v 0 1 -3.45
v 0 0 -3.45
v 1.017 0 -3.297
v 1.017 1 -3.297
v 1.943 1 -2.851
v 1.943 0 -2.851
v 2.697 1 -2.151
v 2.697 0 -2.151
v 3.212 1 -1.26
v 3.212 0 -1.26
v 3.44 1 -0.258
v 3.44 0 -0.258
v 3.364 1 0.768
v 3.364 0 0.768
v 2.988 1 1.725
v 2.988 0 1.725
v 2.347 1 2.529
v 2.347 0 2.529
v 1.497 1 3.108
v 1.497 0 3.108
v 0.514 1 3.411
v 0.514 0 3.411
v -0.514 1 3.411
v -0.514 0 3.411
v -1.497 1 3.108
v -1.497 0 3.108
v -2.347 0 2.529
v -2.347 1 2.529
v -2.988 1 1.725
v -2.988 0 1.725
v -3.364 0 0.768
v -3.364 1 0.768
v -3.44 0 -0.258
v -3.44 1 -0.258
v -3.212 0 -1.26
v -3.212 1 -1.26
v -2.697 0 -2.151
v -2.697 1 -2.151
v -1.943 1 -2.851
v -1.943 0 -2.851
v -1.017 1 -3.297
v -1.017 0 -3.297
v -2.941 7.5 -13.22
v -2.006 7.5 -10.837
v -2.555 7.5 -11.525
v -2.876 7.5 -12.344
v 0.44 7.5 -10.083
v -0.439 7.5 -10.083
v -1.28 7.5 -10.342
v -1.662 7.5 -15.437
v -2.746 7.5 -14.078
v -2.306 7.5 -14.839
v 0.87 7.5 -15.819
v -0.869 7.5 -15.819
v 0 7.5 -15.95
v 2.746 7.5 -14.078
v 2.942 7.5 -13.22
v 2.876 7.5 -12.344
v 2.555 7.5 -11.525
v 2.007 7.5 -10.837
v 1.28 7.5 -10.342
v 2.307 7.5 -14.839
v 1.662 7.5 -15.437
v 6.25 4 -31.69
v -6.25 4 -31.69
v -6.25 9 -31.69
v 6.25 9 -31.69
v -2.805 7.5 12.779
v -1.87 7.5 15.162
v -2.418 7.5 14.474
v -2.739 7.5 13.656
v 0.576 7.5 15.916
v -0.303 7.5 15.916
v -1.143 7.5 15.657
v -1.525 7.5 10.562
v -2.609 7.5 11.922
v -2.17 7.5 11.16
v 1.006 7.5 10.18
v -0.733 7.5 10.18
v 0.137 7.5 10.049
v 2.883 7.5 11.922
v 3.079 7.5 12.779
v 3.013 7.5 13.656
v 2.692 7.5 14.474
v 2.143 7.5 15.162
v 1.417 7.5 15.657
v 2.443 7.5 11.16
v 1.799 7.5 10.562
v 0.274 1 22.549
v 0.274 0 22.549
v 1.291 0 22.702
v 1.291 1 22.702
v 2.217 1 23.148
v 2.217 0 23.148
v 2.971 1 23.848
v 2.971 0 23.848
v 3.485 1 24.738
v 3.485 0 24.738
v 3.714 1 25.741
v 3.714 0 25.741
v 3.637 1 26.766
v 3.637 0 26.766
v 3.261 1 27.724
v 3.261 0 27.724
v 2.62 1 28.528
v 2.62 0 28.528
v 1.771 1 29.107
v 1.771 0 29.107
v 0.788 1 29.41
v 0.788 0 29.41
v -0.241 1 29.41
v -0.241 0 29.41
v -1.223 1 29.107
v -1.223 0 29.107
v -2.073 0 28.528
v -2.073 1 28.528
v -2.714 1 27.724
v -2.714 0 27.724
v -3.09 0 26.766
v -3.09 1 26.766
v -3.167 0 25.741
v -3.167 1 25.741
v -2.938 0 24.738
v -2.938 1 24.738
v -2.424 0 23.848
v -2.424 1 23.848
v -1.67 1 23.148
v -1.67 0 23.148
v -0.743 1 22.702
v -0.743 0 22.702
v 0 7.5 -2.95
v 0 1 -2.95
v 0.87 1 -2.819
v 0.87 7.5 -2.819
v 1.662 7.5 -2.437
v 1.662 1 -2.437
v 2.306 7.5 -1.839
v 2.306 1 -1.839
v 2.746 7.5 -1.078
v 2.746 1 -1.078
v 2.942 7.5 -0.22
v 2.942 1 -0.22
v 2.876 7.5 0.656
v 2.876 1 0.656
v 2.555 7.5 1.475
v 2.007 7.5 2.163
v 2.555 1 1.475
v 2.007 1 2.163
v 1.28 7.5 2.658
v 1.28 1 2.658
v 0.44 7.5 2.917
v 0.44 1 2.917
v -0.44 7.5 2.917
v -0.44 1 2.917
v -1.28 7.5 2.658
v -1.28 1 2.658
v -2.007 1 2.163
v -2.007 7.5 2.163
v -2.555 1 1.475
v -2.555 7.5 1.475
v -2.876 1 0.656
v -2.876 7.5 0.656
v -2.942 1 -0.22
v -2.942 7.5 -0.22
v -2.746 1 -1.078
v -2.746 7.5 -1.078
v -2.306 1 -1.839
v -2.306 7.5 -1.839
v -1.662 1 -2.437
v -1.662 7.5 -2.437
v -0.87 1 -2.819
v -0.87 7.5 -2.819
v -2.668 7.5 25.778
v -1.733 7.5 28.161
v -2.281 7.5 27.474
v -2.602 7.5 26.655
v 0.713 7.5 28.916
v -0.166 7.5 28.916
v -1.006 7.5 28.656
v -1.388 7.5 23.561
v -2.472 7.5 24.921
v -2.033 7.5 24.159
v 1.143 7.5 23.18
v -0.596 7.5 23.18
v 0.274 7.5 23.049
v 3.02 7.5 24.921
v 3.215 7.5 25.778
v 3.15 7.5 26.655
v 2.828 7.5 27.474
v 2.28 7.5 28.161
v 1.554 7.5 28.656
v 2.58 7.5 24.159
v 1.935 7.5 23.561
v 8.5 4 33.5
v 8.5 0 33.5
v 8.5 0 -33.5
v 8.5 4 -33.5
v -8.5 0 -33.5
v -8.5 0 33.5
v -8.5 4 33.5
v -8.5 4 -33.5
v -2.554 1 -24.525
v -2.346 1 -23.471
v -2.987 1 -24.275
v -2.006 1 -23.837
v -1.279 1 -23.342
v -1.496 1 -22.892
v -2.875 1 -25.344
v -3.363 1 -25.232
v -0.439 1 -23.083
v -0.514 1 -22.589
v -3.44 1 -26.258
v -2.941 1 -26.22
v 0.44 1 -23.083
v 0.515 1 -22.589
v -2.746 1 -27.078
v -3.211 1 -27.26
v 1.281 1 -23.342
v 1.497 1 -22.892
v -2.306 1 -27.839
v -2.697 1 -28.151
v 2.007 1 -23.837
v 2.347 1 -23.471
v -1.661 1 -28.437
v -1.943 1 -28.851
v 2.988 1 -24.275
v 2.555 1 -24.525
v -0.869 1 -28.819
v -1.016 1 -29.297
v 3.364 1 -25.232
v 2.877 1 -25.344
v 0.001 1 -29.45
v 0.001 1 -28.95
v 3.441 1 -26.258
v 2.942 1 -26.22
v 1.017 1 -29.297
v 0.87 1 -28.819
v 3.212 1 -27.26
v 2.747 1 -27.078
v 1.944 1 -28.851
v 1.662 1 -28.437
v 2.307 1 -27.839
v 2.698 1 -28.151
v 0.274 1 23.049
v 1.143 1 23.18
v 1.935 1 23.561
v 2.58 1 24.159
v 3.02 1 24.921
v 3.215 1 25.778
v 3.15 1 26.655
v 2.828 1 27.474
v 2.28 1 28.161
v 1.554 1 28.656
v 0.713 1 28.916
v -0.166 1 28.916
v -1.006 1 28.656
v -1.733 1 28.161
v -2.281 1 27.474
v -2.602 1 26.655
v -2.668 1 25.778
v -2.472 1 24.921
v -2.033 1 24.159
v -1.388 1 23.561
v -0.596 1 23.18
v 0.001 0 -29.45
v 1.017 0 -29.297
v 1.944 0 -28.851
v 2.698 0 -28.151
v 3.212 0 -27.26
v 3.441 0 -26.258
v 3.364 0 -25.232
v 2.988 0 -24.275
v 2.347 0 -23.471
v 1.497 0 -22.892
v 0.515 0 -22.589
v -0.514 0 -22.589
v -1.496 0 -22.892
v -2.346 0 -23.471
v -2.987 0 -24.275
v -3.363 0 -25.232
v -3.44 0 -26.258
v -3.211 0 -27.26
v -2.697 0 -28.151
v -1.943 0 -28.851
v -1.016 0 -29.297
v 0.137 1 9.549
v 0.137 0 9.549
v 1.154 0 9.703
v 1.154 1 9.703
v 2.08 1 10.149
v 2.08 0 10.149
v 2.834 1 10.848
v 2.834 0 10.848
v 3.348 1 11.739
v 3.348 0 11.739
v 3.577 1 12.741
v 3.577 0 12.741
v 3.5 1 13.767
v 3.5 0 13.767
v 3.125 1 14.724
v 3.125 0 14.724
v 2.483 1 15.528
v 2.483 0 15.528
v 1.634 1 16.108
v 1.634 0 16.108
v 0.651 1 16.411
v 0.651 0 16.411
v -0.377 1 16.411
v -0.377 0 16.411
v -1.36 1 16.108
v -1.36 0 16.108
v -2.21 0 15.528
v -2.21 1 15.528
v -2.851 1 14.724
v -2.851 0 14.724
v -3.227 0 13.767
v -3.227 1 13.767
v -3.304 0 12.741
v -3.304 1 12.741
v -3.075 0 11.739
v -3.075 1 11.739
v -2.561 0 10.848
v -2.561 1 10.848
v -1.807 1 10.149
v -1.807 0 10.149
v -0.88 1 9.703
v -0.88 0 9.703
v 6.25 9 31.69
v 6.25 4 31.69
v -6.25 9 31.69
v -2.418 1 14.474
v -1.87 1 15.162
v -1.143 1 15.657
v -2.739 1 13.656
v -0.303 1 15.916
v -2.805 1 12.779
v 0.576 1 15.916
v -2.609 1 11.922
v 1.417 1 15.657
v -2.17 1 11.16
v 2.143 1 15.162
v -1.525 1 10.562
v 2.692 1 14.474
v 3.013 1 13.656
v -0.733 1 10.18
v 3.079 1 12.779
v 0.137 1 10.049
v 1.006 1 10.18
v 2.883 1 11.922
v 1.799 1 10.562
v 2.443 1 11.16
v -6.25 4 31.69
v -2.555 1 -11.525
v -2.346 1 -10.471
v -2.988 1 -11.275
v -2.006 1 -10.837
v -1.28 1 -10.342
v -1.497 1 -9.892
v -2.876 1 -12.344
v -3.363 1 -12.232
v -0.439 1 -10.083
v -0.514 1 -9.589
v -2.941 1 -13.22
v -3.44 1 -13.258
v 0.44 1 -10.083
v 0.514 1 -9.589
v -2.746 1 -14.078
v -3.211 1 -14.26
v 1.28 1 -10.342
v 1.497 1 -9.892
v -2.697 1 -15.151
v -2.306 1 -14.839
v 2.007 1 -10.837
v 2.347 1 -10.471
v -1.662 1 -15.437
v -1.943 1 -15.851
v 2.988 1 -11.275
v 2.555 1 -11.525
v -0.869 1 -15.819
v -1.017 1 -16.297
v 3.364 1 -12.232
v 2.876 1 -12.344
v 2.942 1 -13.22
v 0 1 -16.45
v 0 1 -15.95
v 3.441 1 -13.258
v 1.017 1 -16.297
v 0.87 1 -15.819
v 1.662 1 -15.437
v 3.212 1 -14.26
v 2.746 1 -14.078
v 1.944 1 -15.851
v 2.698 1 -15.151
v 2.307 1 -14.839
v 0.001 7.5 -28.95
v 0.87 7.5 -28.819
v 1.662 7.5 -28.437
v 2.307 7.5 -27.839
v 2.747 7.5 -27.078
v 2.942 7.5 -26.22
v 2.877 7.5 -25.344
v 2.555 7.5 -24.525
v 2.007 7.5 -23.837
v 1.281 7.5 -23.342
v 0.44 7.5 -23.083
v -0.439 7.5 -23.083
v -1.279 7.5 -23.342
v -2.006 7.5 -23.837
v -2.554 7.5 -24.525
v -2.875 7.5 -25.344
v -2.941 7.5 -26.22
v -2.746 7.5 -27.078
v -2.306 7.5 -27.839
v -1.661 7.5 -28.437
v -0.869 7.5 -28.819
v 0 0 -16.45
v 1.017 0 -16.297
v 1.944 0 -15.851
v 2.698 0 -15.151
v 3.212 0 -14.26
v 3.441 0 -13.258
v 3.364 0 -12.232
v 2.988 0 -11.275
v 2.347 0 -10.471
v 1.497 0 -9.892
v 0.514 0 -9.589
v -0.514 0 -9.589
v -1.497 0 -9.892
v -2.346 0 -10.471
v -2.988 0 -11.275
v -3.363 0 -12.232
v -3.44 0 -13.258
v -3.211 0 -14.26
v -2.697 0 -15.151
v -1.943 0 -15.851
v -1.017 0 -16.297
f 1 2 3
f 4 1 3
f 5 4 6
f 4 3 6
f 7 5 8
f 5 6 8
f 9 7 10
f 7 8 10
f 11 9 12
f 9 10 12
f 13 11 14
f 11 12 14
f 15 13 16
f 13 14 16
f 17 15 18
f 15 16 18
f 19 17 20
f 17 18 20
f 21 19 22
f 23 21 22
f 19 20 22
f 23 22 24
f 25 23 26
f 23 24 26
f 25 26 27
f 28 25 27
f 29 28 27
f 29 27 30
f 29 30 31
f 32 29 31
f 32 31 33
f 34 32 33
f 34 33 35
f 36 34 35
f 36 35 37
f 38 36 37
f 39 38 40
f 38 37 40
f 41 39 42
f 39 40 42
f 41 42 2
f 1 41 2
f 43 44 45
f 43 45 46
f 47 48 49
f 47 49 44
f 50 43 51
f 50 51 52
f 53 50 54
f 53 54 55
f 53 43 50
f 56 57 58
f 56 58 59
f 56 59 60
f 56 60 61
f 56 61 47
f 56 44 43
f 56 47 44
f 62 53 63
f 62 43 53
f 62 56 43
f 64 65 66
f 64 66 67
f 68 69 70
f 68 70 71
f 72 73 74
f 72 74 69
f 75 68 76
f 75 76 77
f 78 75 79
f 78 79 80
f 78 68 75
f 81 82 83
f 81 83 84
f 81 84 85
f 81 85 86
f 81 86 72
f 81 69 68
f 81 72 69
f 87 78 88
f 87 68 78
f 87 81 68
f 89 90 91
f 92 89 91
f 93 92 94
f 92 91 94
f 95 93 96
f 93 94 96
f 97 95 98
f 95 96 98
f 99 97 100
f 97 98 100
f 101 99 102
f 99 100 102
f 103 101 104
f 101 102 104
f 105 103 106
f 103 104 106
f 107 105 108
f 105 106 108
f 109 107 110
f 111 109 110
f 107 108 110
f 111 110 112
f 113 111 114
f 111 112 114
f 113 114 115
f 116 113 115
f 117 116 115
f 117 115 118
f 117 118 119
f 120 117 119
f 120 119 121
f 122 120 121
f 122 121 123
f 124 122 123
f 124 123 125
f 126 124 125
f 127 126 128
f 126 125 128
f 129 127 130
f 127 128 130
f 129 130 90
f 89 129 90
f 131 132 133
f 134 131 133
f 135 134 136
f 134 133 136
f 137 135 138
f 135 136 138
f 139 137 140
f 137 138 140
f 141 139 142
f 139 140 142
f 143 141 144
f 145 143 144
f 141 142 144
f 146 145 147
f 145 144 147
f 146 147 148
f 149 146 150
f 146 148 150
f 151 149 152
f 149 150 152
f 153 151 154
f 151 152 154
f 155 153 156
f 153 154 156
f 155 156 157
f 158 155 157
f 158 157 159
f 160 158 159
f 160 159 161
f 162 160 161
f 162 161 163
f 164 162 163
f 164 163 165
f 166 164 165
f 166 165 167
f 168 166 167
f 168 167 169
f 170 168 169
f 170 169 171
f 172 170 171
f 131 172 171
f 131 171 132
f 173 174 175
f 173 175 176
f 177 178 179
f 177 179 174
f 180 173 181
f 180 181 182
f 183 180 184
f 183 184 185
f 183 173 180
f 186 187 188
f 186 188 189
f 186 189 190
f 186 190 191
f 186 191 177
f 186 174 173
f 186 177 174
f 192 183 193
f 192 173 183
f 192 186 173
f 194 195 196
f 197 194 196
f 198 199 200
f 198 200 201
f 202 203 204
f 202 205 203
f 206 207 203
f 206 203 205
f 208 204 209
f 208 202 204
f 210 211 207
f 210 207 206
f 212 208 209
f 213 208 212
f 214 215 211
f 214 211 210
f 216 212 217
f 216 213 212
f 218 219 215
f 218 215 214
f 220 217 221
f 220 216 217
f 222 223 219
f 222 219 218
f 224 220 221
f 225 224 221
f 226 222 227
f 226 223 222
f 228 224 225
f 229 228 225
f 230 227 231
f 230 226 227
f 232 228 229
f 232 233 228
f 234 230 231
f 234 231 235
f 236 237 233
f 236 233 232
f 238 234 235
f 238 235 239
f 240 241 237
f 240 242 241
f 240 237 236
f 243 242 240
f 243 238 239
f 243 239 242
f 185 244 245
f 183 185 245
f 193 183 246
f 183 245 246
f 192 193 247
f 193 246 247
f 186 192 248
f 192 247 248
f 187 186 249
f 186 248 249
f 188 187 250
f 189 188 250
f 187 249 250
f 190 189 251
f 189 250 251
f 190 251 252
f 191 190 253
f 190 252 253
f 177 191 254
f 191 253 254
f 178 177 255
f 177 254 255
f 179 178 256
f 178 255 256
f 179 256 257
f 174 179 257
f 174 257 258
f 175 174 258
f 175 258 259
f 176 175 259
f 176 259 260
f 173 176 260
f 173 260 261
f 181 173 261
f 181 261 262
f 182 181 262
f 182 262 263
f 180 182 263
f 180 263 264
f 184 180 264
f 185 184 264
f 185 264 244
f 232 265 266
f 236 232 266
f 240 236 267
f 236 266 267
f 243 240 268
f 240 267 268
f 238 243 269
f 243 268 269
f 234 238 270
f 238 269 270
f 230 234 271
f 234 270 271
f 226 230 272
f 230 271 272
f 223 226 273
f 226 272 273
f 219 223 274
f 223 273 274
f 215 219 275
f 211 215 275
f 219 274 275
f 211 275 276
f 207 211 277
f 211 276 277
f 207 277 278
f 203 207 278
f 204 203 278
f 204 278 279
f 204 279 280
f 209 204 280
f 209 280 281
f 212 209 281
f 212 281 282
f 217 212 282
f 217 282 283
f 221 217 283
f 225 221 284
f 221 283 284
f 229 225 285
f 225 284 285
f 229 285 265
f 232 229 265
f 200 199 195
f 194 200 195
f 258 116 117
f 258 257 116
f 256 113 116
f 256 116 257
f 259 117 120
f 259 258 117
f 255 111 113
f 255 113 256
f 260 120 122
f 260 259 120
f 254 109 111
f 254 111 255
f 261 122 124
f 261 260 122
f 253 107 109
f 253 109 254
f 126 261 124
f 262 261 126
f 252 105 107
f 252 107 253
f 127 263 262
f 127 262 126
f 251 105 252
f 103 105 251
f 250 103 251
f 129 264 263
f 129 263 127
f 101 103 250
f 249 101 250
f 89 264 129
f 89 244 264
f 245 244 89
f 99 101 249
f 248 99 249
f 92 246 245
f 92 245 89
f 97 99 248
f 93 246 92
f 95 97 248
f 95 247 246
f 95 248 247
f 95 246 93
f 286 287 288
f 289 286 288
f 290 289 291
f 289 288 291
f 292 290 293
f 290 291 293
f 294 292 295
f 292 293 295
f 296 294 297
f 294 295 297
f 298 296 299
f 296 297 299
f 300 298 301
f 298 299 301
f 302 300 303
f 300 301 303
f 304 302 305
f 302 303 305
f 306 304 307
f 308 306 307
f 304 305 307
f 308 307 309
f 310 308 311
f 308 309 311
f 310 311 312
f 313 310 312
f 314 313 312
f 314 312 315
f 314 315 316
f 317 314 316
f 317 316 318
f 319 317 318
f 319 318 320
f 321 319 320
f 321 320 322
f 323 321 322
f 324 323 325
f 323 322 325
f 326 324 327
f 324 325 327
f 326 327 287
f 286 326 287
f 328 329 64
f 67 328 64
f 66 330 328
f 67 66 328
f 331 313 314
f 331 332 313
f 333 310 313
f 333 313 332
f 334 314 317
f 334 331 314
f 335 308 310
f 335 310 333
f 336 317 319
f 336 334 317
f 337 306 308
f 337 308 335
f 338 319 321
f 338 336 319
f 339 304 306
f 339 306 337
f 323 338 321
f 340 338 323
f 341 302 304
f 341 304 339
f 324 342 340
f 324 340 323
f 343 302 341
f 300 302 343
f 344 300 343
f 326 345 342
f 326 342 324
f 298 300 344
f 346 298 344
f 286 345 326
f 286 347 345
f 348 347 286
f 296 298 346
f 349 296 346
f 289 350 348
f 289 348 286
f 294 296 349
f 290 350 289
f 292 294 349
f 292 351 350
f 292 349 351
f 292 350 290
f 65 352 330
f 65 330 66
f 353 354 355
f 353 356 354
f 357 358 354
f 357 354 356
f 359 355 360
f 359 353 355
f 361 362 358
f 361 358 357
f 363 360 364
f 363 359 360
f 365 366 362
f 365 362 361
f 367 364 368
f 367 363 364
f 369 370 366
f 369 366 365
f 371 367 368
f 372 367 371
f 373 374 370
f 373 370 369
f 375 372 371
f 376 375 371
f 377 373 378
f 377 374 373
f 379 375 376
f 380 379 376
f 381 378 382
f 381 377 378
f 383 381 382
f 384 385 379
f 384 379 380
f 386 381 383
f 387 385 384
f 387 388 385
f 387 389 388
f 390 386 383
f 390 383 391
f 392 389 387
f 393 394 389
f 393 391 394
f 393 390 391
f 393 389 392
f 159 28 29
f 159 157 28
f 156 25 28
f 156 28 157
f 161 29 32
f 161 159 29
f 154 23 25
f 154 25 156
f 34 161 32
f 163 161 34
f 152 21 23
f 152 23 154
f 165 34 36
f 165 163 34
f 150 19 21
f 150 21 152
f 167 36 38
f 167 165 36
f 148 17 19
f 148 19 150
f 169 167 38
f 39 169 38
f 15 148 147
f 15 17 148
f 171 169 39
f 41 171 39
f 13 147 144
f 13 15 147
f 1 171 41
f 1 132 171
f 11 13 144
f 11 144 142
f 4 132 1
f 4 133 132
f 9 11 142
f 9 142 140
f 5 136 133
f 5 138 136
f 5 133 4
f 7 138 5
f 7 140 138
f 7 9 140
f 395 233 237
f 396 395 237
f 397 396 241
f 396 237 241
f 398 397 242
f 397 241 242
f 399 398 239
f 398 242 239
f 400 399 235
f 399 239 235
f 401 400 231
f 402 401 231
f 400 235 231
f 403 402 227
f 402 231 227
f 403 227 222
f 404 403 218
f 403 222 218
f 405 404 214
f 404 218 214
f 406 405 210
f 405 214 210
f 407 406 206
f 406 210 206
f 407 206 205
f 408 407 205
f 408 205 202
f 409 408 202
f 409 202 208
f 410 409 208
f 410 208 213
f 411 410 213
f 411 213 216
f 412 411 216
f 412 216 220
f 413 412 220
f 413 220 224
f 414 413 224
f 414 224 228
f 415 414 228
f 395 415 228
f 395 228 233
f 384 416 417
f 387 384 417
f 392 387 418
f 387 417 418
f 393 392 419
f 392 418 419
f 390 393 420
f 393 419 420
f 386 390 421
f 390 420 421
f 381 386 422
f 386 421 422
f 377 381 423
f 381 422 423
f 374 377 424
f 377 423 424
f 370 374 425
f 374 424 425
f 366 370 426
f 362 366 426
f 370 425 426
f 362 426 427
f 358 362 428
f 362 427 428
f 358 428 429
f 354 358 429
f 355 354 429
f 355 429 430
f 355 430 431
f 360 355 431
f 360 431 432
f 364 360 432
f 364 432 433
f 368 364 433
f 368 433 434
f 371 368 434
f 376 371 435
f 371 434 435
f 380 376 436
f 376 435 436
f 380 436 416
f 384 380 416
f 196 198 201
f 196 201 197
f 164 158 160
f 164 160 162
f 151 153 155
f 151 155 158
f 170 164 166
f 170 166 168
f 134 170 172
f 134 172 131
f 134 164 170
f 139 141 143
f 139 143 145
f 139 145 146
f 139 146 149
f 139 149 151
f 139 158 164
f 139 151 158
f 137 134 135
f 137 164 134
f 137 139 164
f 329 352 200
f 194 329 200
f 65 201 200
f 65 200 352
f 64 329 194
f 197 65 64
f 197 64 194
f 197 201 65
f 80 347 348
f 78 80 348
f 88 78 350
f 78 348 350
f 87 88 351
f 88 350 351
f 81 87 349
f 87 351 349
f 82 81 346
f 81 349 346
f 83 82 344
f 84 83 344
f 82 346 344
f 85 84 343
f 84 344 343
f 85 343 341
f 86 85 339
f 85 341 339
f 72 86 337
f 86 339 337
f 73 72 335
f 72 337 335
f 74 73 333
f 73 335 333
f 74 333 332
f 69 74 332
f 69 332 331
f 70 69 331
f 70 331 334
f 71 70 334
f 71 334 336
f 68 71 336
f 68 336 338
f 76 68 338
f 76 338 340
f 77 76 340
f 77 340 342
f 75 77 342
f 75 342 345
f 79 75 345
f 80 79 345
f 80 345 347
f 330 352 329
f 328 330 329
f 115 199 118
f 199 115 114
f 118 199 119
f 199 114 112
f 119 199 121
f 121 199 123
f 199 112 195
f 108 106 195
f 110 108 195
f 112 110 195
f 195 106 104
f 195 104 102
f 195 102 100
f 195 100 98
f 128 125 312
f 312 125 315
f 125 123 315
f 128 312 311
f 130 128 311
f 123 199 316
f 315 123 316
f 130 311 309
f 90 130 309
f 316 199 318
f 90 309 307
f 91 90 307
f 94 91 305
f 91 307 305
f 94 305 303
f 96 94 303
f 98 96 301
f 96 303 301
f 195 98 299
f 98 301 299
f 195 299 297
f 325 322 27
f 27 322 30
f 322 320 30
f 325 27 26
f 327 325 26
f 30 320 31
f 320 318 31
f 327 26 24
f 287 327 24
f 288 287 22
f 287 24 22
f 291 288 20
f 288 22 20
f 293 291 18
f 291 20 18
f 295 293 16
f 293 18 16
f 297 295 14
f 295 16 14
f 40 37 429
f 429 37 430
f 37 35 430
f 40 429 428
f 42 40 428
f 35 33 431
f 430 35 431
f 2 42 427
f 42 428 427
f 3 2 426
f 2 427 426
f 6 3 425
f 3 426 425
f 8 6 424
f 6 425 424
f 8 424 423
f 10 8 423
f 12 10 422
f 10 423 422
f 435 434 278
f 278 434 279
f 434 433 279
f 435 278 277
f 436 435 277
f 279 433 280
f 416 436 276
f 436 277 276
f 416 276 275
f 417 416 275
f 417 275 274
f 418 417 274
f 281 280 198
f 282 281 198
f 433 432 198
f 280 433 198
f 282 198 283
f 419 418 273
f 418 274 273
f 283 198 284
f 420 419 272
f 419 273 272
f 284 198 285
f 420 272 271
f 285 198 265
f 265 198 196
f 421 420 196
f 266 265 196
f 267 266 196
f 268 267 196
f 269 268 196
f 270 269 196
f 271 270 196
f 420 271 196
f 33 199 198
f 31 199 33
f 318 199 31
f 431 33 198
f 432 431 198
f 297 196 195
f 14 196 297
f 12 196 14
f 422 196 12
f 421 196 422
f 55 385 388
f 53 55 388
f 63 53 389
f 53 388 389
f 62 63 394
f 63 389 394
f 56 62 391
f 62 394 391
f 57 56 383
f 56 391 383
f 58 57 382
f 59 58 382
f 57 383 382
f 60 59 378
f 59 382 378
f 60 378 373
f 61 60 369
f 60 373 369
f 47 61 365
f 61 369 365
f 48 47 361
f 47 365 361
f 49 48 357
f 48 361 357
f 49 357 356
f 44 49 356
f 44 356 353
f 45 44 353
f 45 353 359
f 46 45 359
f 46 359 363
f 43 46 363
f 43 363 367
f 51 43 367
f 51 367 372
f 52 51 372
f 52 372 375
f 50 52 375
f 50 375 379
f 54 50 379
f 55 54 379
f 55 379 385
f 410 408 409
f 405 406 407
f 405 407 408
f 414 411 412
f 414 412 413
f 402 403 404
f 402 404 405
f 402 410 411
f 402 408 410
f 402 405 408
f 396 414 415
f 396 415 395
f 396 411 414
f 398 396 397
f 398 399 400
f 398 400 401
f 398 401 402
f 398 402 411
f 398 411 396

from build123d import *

# Parameters (mm, degrees)
SKETCH1_W           = 17
SKETCH1_H           = 67
BOSS_EXTRUDE1_DEPTH = 4
SKETCH2_W           = 12.5
SKETCH2_H           = 63.38
BOSS_EXTRUDE2_DEPTH = 5
SKETCH3_R           = 3.45
CUT_EXTRUDE1_DEPTH  = 1
SKETCH4_R           = 2.95
CUT_EXTRUDE2_DEPTH  = 7.5


with BuildPart() as part:
    # Sketch1 → Boss-Extrude1 (new body)
    with BuildSketch(Plane(origin=(0, 0, 0), x_dir=(1, 0, 0), z_dir=(0, 1, 0))):
        Rectangle(SKETCH1_W, SKETCH1_H)
    extrude(amount=BOSS_EXTRUDE1_DEPTH)

    # Sketch2 → Boss-Extrude2 (add)
    with BuildSketch(Plane(origin=(0, 4, 0), x_dir=(1, 0, 0), z_dir=(0, 1, 0))):
        Rectangle(SKETCH2_W, SKETCH2_H)
    extrude(amount=BOSS_EXTRUDE2_DEPTH)

    # Sketch3 → Cut-Extrude1 (cut)
    with BuildSketch(Plane.XZ):
        with Locations(Location((0, 0, 0), (0, 0, 270))):
            Circle(SKETCH3_R)
        with Locations(Location((0.136814879, 12.999280045, 0), (0, 0, 270))):
            Circle(SKETCH3_R)
        with Locations(Location((0.273629759, 25.99856009, 0), (0, 0, 270))):
            Circle(SKETCH3_R)
        with Locations(Location((0.000272251, -12.999999997, 0), (0, 0, 270))):
            Circle(SKETCH3_R)
        with Locations(Location((0.000544502, -25.999999994, 0), (0, 0, 270))):
            Circle(SKETCH3_R)
    extrude(amount=-CUT_EXTRUDE1_DEPTH, mode=Mode.SUBTRACT)

    # Sketch4 → Cut-Extrude2 (cut)
    with BuildSketch(Plane.XZ):
        with Locations(Location((0, 0, 0), (0, 0, 270))):
            Circle(SKETCH4_R)
        with Locations(Location((0.136814879, 12.999280045, 0), (0, 0, 270))):
            Circle(SKETCH4_R)
        with Locations(Location((0.273629759, 25.99856009, 0), (0, 0, 270))):
            Circle(SKETCH4_R)
        with Locations(Location((0.000272251, -12.999999997, 0), (0, 0, 270))):
            Circle(SKETCH4_R)
        with Locations(Location((0.000544502, -25.999999994, 0), (0, 0, 270))):
            Circle(SKETCH4_R)
    extrude(amount=-CUT_EXTRUDE2_DEPTH, mode=Mode.SUBTRACT)


solid = part.part
